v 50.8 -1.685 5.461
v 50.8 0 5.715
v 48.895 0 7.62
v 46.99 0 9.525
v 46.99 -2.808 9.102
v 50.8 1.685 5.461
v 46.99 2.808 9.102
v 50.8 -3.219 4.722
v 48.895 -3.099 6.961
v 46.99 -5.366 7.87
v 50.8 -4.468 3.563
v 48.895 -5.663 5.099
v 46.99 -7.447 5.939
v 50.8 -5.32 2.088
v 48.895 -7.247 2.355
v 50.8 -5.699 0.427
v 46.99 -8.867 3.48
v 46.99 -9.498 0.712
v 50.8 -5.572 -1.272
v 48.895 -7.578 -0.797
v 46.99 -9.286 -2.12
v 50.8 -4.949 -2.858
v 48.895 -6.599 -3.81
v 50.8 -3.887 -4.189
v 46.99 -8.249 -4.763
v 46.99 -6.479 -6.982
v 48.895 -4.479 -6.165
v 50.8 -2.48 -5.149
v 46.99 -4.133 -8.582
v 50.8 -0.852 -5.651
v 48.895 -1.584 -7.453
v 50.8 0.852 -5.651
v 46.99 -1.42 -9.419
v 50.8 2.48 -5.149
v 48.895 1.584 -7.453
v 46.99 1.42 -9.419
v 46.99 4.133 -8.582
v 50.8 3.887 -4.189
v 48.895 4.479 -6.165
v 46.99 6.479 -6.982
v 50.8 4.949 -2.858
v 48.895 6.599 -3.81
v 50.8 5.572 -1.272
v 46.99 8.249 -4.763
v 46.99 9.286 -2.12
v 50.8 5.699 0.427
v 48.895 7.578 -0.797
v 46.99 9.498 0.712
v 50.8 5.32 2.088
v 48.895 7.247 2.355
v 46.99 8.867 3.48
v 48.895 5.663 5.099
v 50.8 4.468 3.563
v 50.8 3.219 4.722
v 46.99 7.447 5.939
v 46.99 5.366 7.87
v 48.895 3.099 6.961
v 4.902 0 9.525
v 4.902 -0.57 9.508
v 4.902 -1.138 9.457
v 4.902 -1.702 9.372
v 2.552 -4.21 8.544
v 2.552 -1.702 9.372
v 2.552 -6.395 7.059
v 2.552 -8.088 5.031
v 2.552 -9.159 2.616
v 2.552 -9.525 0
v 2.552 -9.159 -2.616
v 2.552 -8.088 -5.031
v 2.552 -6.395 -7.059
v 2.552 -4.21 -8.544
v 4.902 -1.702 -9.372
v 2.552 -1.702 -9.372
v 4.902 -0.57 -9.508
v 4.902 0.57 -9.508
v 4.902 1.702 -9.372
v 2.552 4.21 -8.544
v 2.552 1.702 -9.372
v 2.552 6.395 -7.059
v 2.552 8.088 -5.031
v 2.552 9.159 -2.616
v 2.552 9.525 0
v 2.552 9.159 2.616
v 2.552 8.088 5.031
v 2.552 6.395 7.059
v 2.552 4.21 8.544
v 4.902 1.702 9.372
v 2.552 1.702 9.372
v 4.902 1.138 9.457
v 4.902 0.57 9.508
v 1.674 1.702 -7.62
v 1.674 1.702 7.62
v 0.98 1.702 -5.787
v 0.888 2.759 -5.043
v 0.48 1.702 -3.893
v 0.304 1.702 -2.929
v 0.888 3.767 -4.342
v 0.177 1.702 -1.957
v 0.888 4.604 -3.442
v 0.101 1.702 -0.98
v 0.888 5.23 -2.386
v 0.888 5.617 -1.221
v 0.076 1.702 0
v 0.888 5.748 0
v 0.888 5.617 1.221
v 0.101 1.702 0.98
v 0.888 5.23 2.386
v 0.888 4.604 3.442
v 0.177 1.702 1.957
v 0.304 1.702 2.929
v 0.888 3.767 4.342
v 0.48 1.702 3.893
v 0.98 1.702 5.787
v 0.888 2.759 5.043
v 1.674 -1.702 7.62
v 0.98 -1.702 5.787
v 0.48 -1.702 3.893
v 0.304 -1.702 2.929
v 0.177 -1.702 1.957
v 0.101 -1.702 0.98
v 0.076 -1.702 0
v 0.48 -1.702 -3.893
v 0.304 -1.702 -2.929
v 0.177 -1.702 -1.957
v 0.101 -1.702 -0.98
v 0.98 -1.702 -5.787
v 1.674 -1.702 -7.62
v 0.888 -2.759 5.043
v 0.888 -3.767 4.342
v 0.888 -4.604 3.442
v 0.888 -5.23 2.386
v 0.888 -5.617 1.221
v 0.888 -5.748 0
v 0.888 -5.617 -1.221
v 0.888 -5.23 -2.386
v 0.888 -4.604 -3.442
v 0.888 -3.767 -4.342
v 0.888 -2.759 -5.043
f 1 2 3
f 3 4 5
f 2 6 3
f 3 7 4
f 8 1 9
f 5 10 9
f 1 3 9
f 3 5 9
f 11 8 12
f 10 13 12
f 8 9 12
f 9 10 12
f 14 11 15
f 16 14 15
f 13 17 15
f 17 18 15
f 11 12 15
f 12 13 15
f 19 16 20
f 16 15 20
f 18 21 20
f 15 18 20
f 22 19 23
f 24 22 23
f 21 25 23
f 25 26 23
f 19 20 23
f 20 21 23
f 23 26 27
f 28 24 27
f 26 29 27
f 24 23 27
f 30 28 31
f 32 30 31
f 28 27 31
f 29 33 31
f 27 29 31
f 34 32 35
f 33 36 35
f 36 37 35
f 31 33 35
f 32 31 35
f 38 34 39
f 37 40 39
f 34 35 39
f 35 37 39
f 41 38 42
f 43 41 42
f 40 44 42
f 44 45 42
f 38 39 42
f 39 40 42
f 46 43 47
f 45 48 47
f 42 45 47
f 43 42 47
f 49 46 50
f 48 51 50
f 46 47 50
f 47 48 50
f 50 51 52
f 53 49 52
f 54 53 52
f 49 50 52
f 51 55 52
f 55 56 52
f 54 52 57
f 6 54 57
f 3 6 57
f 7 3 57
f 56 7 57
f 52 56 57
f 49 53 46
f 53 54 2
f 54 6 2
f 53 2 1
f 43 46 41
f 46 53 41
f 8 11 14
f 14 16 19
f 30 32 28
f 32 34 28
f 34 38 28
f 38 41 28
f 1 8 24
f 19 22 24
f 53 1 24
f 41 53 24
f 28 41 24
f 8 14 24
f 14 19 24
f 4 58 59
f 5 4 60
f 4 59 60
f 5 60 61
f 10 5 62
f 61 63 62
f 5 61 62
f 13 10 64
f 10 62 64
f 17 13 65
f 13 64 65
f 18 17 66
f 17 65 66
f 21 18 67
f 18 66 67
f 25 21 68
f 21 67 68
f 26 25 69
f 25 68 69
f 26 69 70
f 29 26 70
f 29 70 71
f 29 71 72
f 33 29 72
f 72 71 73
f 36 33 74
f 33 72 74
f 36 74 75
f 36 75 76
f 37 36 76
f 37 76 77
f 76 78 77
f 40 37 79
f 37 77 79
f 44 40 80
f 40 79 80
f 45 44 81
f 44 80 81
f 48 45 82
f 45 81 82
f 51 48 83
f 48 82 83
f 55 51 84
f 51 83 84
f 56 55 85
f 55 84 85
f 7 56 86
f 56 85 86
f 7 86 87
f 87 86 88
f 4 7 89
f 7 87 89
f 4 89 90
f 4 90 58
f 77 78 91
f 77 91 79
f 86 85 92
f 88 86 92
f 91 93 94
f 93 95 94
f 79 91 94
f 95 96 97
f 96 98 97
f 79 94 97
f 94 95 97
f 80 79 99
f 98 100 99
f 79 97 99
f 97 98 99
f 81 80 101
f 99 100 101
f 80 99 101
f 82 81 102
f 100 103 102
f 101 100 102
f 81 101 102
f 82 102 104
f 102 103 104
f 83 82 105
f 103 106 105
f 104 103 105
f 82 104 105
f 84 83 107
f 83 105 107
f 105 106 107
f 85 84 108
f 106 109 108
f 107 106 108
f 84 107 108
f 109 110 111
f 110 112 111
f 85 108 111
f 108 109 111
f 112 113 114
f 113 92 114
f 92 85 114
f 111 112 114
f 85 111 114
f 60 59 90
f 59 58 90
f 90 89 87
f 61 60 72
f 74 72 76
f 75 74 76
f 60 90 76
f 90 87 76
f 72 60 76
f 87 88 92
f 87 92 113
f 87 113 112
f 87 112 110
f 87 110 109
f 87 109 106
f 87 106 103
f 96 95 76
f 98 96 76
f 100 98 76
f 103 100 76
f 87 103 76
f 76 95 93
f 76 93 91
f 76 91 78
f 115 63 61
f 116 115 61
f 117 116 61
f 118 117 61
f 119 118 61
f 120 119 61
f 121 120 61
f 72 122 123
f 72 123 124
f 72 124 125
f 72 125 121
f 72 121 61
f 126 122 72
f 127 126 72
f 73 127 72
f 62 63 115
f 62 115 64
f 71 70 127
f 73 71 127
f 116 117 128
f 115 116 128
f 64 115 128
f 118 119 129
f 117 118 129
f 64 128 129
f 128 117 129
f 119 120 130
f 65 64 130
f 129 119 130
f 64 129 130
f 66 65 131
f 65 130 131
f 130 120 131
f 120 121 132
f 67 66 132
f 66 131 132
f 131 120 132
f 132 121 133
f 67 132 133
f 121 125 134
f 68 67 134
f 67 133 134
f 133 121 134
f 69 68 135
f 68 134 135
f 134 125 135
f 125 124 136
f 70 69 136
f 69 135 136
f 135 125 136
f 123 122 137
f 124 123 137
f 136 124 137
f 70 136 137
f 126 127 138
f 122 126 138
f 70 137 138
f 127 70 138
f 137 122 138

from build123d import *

# Parameters (mm, degrees)
SKETCH2_W  = 19.05
SKETCH2_H  = 3.4036
SLOT_DEPTH = 4.9022


with BuildPart() as part:
    # BodySke → BaseBody (revolve)
    with BuildSketch(Plane.XY, mode=Mode.PRIVATE) as basebody_sk:
        with BuildLine():
            Line((50.8, 0), (50.8, 5.715))
            Line((50.8, 5.715), (46.99, 9.525))
            Line((46.99, 9.525), (2.552216058, 9.525))
            ThreePointArc((2.552216058, 9.525), (0.649113009, 4.930502809), (0, 0))
            Line((0, 0), (50.8, 0))
        make_face()
    revolve(basebody_sk.sketch.rotate(Axis((-12.7, 0, 0), (1, 0, 0)), 90), axis=Axis((-12.7, 0, 0), (1, 0, 0)))

    # Sketch2 → Slot (cut)
    with BuildSketch(Plane(origin=(0, 0, 0), x_dir=(0, 0, -1), z_dir=(1, 0, 0))):
        Rectangle(SKETCH2_W, SKETCH2_H)
    extrude(amount=SLOT_DEPTH, mode=Mode.SUBTRACT)


solid = part.part
